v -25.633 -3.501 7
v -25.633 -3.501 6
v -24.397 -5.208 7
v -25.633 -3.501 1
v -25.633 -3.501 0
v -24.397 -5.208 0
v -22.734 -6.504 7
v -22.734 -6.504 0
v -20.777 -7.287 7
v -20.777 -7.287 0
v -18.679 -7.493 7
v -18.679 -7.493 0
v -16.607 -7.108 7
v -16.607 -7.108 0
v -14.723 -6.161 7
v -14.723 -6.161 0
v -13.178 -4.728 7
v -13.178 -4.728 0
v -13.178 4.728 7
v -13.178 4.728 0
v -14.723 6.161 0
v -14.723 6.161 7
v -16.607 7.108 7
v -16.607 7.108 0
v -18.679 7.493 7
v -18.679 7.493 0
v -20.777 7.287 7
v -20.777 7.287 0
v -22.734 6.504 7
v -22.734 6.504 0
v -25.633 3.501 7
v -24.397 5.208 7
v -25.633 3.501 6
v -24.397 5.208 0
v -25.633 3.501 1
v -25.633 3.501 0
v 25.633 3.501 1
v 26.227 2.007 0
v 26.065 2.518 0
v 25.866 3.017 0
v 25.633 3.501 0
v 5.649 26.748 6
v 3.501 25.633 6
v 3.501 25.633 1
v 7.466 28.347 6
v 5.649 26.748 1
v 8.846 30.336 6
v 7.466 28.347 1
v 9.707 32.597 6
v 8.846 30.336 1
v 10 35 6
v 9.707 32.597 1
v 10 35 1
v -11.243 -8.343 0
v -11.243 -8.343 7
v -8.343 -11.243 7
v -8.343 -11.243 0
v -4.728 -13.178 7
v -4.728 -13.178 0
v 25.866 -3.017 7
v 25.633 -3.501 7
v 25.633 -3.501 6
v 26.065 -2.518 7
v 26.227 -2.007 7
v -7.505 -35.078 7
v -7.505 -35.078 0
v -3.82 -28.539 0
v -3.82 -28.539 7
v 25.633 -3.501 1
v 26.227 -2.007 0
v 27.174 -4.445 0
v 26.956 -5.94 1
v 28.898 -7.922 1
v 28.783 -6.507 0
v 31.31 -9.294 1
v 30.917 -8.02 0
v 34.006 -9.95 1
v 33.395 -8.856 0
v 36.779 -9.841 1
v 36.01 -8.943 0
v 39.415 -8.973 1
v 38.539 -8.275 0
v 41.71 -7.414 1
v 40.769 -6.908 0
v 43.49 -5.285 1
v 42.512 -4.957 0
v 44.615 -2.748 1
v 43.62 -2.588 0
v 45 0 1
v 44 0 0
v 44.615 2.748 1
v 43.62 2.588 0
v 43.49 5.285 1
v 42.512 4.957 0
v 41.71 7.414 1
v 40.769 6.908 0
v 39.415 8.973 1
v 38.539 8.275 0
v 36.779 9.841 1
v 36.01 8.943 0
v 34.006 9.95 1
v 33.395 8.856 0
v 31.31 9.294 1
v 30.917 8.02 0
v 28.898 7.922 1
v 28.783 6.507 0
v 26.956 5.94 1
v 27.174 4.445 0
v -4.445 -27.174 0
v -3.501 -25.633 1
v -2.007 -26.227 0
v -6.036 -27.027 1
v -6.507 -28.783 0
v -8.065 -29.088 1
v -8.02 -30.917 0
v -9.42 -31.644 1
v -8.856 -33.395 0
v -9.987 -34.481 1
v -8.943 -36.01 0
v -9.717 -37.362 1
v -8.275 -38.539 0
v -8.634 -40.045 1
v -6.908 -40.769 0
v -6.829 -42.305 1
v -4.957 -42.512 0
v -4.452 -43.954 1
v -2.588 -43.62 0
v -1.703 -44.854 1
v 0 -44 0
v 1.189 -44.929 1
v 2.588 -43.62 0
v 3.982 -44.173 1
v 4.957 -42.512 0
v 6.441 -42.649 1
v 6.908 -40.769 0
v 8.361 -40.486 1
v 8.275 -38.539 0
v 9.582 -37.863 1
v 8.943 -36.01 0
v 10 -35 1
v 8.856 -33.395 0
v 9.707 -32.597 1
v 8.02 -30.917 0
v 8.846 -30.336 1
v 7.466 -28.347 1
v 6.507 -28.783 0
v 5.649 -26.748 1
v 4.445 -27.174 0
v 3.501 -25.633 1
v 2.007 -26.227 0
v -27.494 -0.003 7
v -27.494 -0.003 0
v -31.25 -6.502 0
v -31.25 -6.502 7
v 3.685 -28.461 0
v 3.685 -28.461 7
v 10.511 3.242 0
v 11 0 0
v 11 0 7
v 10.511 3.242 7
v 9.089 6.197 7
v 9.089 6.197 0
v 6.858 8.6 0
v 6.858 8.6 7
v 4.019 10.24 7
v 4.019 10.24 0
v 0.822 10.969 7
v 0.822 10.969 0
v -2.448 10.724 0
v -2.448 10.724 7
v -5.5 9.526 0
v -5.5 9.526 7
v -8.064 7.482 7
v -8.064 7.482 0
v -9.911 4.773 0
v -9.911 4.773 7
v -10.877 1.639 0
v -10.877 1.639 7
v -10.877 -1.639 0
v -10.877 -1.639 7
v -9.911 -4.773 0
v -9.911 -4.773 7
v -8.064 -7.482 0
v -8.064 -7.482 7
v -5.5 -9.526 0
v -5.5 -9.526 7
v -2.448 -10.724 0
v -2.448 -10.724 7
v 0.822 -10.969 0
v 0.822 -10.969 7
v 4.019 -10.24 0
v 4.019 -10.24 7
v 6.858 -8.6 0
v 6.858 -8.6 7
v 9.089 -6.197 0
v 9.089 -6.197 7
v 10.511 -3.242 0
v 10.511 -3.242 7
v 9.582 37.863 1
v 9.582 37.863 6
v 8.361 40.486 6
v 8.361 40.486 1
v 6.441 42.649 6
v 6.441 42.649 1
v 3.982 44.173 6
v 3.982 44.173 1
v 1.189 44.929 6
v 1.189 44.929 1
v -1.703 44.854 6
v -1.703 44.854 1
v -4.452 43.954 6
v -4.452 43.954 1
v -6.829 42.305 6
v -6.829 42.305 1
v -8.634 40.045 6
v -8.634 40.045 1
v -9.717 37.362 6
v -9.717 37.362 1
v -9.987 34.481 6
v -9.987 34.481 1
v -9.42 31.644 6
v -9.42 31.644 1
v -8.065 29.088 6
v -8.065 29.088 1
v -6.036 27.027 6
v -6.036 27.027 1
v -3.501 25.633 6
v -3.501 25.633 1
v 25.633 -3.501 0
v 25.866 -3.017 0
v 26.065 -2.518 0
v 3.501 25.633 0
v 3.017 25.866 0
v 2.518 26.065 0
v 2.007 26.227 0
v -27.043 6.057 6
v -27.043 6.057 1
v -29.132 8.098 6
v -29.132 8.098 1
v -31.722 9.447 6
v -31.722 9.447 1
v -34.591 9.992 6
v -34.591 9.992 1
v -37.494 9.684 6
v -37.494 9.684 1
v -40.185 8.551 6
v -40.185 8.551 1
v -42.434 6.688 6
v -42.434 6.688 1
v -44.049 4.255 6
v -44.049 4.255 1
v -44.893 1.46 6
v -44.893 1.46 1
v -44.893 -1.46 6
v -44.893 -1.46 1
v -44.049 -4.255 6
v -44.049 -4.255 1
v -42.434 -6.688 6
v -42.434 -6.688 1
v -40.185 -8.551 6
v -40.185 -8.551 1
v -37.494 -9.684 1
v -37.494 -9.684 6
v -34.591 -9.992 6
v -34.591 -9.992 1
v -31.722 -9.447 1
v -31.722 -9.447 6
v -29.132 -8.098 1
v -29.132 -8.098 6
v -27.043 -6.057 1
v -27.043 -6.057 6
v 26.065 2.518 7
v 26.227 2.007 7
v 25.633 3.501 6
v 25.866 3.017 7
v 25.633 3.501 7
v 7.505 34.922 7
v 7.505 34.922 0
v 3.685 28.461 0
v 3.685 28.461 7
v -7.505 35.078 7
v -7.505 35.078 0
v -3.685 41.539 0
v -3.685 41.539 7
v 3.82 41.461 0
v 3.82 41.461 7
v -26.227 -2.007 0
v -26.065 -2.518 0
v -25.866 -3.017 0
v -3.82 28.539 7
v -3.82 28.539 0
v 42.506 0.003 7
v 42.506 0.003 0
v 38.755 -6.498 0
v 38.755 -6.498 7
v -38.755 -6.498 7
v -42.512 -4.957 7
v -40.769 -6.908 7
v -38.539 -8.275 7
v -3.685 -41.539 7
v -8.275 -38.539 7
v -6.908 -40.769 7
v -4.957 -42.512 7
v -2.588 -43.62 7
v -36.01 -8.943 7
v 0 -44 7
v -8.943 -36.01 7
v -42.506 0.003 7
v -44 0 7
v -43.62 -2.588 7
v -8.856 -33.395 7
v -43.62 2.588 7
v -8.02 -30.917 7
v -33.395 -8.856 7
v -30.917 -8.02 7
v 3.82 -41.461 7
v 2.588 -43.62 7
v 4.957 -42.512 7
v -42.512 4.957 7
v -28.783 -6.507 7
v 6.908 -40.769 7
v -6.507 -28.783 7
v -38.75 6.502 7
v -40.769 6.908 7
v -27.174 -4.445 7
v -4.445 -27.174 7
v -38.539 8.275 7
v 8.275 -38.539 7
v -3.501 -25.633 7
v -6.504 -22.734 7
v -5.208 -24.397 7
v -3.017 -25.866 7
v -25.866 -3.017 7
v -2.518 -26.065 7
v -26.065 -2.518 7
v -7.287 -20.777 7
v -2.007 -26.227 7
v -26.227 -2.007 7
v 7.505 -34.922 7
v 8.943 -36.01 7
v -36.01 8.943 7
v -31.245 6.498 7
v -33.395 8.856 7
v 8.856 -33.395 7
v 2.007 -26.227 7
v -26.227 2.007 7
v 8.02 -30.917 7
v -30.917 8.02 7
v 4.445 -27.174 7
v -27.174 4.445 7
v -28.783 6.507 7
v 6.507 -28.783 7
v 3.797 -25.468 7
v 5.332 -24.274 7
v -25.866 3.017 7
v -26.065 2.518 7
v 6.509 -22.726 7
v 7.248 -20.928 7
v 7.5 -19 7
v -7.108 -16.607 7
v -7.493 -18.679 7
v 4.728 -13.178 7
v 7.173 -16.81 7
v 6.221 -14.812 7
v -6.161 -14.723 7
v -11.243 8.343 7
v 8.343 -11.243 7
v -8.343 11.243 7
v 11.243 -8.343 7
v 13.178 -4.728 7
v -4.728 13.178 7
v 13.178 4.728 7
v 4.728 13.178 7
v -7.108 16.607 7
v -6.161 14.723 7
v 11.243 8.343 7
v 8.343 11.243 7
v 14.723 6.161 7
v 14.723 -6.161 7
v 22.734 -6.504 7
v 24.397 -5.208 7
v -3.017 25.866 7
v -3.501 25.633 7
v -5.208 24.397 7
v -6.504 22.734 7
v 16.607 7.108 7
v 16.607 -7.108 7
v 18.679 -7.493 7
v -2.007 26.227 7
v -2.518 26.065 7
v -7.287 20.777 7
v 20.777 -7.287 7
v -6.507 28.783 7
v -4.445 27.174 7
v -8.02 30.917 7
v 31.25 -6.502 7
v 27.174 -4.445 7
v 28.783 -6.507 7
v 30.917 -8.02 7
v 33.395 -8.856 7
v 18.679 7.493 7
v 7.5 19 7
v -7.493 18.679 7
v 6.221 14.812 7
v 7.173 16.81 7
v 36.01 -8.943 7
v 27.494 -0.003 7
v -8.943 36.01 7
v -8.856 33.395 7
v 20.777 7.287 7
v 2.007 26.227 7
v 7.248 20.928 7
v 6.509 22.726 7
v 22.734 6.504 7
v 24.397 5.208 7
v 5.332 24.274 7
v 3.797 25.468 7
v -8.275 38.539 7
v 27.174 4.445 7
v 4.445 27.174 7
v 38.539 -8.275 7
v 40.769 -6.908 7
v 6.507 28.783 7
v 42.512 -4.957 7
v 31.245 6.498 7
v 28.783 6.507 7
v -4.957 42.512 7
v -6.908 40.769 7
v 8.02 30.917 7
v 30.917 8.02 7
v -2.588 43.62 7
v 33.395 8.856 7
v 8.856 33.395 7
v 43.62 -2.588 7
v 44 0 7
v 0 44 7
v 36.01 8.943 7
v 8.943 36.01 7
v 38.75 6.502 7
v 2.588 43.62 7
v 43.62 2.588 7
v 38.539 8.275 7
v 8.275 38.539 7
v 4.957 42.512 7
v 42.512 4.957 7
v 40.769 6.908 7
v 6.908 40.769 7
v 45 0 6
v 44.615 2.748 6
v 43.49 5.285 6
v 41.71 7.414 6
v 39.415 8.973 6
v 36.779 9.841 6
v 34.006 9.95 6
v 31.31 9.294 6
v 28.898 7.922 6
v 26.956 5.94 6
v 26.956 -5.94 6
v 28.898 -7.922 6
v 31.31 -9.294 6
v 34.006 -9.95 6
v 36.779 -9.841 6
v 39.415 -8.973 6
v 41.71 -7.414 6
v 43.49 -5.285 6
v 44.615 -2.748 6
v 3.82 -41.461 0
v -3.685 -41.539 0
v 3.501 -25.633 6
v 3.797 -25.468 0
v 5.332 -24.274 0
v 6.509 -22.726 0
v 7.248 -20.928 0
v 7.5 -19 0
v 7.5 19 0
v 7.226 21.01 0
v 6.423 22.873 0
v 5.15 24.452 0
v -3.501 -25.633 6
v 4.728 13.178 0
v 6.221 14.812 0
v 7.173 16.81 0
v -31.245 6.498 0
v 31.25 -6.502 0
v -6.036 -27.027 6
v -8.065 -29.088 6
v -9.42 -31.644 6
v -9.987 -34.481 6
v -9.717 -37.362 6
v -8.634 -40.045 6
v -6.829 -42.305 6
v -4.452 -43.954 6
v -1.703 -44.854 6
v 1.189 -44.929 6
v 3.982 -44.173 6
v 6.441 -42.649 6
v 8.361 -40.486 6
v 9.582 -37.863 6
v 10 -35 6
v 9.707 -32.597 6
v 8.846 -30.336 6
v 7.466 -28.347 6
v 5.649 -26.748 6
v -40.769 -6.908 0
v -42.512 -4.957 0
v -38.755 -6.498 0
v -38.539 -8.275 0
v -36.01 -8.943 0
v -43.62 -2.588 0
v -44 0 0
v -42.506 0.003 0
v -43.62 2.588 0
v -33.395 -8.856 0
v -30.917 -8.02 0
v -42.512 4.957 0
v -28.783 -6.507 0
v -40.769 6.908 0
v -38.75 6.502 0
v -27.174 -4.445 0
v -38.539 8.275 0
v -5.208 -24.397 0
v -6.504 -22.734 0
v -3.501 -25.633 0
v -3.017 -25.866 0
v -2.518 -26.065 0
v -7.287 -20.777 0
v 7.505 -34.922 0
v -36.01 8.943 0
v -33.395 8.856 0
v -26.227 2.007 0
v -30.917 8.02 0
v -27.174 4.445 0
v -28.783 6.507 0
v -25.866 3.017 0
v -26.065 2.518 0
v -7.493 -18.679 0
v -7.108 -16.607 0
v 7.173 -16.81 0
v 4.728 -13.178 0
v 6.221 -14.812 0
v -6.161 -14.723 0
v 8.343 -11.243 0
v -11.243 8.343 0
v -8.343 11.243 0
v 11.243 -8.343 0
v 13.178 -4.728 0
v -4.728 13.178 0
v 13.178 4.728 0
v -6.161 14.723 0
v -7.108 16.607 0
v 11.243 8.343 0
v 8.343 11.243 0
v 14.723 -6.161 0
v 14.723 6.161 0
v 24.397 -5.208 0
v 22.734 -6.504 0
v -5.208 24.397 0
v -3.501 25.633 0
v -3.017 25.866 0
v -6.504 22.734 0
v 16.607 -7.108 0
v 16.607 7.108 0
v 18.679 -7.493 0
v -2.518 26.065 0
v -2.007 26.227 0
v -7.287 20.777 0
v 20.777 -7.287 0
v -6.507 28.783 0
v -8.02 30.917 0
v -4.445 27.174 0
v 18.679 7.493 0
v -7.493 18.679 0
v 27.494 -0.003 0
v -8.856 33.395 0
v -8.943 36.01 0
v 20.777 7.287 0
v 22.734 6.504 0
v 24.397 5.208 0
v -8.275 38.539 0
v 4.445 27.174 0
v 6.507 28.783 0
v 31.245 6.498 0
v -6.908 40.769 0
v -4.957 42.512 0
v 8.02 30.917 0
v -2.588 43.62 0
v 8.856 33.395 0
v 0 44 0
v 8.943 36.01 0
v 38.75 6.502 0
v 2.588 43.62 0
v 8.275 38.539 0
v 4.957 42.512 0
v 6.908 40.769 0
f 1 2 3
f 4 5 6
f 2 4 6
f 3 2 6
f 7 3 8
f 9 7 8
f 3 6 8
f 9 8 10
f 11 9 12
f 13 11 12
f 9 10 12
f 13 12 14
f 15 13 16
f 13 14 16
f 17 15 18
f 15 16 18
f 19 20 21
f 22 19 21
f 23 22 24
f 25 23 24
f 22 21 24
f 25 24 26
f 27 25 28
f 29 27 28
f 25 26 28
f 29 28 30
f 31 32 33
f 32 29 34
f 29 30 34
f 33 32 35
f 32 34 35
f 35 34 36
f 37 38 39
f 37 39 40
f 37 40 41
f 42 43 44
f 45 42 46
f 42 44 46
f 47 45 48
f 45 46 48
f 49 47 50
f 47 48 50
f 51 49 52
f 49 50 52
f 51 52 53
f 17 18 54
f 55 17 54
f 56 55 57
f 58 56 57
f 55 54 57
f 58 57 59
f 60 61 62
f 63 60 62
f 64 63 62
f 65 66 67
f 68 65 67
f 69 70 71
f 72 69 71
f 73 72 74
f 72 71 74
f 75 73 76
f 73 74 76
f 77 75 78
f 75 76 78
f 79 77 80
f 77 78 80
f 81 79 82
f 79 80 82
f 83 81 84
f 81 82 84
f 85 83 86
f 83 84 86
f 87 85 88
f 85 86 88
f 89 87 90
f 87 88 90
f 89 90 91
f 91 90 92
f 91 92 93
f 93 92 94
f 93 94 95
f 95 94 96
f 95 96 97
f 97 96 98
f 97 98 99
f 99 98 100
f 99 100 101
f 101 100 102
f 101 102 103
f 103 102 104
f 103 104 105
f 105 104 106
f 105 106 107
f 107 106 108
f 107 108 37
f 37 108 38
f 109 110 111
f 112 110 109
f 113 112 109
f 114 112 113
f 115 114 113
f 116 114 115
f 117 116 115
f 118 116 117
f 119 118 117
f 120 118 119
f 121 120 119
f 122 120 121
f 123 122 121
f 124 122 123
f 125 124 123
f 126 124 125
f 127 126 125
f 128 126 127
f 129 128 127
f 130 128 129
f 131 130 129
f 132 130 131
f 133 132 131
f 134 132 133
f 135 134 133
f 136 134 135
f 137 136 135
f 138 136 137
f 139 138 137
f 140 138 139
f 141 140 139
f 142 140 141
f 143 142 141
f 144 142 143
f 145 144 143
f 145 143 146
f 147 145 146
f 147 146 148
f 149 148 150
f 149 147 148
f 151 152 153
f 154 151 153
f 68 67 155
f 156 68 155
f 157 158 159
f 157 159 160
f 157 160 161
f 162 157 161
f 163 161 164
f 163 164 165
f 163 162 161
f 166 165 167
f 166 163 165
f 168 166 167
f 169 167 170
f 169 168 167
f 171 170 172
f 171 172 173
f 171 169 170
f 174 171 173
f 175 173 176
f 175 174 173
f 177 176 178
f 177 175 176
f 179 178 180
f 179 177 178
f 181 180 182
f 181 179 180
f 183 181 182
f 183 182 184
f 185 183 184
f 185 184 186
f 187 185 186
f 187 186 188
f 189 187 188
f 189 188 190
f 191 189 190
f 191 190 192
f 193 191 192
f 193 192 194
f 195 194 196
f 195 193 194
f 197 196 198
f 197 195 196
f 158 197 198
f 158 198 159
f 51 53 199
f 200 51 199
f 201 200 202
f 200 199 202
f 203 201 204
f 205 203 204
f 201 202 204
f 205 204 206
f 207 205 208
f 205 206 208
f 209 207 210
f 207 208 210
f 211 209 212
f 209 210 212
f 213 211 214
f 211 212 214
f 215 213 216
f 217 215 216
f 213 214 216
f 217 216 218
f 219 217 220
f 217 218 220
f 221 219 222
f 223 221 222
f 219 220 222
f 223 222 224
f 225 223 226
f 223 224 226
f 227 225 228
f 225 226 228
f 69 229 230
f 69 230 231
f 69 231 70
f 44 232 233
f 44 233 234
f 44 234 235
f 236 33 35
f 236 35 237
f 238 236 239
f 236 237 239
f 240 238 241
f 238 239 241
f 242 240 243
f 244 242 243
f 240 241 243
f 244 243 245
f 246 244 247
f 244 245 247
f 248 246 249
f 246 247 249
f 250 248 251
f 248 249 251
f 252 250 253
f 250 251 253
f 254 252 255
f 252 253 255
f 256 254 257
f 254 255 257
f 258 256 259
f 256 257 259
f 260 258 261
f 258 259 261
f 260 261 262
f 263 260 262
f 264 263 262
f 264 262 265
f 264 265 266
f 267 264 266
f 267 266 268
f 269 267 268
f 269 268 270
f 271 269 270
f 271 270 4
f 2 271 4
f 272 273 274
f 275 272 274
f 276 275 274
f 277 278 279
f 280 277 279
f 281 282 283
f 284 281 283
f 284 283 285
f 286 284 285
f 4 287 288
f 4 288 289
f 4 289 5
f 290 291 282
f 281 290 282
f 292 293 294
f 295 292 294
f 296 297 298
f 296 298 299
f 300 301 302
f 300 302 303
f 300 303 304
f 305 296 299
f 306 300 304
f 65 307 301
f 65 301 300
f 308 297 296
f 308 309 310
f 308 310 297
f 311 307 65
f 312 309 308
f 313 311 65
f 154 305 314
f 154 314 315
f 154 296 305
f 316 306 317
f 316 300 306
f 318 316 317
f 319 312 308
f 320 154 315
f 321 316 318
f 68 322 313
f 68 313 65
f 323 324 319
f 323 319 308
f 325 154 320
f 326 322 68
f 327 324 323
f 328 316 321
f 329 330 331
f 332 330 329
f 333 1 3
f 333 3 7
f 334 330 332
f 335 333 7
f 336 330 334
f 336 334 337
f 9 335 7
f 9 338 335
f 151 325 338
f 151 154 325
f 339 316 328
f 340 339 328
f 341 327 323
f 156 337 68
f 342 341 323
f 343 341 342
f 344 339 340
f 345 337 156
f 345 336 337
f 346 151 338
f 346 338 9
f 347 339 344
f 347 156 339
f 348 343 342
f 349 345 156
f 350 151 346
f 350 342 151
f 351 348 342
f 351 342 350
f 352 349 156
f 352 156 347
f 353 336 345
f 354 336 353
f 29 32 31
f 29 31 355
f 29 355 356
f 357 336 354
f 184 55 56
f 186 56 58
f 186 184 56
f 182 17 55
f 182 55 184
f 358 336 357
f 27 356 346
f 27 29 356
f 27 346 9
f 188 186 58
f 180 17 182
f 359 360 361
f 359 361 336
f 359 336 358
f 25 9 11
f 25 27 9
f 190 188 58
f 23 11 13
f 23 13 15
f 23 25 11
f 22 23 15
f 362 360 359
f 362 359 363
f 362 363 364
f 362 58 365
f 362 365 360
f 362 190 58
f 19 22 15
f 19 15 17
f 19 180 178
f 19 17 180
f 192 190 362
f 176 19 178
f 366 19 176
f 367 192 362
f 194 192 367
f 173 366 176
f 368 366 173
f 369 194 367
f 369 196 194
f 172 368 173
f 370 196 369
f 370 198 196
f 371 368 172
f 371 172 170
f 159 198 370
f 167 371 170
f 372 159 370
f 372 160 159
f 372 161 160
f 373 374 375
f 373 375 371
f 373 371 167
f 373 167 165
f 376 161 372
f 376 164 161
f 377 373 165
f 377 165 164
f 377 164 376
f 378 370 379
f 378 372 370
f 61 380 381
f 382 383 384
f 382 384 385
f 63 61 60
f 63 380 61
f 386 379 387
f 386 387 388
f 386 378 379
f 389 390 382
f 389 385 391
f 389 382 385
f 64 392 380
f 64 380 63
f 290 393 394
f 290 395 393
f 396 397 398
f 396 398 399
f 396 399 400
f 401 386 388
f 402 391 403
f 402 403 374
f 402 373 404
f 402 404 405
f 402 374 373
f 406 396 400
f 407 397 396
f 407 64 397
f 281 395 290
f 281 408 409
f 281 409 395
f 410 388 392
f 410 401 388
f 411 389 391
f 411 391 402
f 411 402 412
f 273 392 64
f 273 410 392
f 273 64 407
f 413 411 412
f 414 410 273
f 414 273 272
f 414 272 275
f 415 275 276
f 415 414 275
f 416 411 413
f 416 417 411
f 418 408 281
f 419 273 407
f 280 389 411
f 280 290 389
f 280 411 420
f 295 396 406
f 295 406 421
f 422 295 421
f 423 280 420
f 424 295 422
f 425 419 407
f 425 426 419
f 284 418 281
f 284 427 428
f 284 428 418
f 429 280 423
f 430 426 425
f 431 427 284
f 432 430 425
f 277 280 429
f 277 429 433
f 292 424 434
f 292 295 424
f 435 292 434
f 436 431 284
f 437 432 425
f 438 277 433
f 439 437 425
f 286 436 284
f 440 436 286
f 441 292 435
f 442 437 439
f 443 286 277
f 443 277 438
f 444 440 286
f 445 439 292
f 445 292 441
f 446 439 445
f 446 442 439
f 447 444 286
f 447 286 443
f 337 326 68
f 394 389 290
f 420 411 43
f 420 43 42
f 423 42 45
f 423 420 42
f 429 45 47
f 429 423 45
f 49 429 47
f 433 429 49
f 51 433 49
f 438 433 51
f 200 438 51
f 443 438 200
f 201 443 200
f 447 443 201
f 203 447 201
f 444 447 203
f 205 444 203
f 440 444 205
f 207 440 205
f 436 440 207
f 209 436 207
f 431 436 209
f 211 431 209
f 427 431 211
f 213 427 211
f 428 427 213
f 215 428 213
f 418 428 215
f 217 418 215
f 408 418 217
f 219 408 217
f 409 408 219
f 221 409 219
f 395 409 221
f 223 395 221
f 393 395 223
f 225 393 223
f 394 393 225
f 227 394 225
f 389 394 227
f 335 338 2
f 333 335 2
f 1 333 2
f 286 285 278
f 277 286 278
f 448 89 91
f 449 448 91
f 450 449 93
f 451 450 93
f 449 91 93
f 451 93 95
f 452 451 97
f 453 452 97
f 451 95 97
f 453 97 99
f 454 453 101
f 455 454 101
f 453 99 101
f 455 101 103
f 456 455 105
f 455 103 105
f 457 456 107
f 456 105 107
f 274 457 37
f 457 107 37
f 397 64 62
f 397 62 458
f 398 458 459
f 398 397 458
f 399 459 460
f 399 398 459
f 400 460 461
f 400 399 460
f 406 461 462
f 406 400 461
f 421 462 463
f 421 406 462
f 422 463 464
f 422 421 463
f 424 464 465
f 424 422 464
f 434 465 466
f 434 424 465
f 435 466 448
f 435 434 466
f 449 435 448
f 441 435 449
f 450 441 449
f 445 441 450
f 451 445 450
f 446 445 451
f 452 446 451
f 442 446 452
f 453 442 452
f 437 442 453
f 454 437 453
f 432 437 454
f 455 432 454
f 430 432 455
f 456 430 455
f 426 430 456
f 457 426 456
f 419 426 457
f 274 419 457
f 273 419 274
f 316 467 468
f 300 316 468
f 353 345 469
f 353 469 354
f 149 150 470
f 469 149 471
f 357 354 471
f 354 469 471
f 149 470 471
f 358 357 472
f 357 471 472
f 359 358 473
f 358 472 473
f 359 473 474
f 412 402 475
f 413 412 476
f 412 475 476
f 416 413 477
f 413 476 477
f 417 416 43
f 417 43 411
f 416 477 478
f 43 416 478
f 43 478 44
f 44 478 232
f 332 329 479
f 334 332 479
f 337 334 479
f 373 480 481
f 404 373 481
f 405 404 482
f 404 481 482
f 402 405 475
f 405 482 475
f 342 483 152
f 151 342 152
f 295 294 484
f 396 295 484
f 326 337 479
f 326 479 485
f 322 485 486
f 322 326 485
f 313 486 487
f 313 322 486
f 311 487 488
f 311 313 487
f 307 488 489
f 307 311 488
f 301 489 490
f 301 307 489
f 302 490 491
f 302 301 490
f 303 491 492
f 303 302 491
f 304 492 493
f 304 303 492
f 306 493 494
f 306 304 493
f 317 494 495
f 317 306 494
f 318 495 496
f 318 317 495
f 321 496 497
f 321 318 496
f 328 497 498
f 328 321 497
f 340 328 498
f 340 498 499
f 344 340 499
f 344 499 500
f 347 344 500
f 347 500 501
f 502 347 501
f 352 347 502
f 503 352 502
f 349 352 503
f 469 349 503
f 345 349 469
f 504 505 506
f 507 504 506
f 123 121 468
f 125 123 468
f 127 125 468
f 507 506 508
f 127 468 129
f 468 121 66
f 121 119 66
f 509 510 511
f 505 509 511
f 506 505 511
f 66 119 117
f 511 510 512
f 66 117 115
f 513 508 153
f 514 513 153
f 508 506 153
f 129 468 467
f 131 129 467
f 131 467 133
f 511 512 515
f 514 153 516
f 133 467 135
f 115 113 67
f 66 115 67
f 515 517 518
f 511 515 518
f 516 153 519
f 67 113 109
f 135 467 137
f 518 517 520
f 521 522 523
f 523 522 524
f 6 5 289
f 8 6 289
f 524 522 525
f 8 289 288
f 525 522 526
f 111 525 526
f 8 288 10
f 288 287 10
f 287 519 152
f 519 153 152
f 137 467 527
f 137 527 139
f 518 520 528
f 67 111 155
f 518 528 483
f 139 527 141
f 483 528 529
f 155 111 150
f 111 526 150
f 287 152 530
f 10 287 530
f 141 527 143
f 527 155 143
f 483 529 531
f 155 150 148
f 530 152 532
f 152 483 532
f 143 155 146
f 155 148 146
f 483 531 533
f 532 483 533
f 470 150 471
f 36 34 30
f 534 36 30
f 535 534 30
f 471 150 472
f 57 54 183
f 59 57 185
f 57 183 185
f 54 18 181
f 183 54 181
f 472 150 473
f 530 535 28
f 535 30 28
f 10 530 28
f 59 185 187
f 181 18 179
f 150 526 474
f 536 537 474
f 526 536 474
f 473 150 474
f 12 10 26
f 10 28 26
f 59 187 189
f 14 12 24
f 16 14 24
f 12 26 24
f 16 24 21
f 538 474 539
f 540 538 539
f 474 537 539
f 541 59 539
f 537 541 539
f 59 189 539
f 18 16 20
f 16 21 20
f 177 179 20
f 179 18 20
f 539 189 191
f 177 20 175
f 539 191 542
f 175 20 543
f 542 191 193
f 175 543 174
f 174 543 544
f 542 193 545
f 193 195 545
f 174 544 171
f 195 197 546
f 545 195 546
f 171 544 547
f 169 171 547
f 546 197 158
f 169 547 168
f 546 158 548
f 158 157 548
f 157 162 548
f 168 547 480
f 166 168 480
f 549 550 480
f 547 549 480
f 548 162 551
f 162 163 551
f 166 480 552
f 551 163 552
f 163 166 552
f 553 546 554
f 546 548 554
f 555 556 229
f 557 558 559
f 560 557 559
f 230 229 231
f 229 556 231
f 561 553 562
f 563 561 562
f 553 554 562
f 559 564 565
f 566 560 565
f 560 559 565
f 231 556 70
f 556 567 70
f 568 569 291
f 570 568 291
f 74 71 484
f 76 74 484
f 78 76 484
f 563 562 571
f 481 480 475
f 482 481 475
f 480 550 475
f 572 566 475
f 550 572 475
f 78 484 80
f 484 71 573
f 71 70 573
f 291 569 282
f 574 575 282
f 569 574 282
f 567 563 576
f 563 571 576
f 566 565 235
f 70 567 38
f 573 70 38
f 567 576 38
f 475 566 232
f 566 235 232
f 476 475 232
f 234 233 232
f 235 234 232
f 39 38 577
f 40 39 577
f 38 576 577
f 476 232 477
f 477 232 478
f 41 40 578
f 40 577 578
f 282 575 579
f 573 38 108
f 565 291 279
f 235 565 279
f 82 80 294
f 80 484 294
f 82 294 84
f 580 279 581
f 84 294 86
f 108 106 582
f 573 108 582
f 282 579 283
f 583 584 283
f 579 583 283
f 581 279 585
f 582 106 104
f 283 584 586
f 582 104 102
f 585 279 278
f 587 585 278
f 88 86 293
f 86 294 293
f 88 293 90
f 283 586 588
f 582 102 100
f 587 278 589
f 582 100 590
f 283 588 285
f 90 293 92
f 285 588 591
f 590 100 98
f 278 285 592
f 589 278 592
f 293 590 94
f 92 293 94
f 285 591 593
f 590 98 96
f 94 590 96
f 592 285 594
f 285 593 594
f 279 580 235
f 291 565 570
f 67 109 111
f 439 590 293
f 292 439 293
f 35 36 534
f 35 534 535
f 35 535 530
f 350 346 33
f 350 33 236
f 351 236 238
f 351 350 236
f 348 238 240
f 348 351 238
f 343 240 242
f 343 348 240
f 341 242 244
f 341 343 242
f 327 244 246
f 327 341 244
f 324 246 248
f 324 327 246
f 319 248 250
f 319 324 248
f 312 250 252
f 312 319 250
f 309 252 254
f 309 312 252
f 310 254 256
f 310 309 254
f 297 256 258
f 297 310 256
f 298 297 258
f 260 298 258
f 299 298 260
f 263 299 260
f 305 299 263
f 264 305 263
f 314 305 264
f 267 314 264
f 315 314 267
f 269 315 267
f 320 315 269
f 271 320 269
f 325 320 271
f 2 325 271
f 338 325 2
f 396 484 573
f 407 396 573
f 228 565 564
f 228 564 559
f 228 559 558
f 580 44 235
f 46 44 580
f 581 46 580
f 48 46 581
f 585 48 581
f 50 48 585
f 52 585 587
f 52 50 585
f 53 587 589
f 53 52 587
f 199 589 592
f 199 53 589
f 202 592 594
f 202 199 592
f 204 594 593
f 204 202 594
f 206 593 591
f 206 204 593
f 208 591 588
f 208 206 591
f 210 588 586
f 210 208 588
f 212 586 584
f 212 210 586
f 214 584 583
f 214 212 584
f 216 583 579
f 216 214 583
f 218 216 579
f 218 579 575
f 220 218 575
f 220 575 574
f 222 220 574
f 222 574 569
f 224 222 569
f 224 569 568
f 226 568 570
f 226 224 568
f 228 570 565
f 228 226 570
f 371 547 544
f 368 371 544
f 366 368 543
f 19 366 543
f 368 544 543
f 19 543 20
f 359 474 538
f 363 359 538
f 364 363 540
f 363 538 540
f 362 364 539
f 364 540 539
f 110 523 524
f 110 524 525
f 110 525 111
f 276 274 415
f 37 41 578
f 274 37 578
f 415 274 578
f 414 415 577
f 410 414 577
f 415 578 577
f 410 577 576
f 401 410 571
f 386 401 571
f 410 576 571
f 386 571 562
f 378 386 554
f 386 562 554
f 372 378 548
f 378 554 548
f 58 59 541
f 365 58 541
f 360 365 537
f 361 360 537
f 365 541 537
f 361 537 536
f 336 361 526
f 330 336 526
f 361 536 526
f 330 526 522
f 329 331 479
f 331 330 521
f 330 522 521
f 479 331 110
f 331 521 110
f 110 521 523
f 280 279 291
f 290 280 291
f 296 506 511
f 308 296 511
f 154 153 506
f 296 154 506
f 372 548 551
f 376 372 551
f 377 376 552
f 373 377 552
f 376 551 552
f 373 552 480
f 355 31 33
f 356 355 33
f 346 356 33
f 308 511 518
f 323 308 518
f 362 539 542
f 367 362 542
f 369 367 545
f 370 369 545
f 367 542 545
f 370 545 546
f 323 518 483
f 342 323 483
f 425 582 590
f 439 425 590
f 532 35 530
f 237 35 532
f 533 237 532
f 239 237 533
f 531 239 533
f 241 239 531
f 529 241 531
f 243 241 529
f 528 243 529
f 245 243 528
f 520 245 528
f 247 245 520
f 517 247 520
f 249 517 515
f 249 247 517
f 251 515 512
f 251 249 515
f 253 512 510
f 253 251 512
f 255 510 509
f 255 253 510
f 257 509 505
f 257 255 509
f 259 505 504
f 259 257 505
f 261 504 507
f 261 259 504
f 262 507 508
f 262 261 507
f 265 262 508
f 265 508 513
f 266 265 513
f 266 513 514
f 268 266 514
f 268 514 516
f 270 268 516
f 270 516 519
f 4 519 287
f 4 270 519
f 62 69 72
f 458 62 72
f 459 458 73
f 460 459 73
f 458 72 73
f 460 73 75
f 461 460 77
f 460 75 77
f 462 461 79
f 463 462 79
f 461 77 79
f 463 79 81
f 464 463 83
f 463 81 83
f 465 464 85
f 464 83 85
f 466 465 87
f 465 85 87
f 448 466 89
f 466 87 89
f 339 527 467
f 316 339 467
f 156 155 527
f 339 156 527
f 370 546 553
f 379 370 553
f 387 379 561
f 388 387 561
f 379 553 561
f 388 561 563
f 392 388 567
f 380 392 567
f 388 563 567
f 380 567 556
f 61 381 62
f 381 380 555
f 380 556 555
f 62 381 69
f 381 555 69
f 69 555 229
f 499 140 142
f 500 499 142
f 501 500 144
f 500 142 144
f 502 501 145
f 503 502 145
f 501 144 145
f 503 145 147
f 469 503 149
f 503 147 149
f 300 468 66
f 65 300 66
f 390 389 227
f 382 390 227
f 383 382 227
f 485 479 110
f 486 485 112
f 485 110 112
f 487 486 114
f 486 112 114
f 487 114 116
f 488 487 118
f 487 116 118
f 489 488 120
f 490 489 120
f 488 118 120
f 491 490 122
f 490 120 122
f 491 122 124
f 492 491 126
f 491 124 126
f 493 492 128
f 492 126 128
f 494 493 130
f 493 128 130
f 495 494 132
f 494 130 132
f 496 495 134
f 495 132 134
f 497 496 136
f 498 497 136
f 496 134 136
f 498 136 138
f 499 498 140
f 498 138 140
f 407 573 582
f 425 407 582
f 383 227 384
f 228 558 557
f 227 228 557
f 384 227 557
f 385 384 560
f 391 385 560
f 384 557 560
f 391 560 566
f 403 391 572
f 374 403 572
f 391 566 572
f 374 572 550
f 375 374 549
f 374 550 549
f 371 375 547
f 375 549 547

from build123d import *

# Parameters (mm, degrees)
F0_R         = 11
F1_DEPTH     = 7
F2_T4_ANGLE  = 348.6337760753
F2_S5_R      = 7.5
F2_T6_DEPTH  = 16
F2_T10_ANGLE = 348.6337760753
F2_S11_R     = 7.5
F2_T12_DEPTH = 16
F2_T16_ANGLE = 348.6337760753
F2_S17_R     = 7.5
F2_T18_DEPTH = 16
F2_T22_ANGLE = 348.6337760753
F2_S23_R     = 7.5
F2_T24_DEPTH = 16
F3_T4_ANGLE  = 348.6337760753
F3_S5_R      = 7.5
F3_T6_DEPTH  = 16
F3_T10_ANGLE = 348.6337760753
F3_S11_R     = 7.5
F3_T12_DEPTH = 16
F3_T16_ANGLE = 348.6337760753
F3_S17_R     = 7.5
F3_T18_DEPTH = 16
F3_T22_ANGLE = 348.6337760753
F3_S23_R     = 7.5
F3_T24_DEPTH = 16


# Not quite as in the source:
# - a fillet or chamfer that OpenCascade refuses, or shapes differently, is made with other operations: its cross-section is extruded or revolved along the edge and cut away or added


with BuildPart() as f1:
    # F0 (on Top) → F1 (new body)
    with BuildSketch(Plane.XY):
        with BuildLine():
            ThreePointArc((13.1776315789, -4.727581408), (13.7928757354, -2.3992871748), (14, 0))
            ThreePointArc((14, 0), (13.7928757354, 2.3992871748), (13.1776315789, 4.727581408))
            ThreePointArc((13.1776315789, 4.727581408), (11.5, 0), (13.1776315789, -4.727581408))
        make_face()
        with BuildLine():
            ThreePointArc((13.1776315789, 4.727581408), (13.7928757354, 2.3992871748), (14, 0))
            ThreePointArc((14, 0), (13.7928757354, -2.3992871748), (13.1776315789, -4.727581408))
            ThreePointArc((13.1776315789, -4.727581408), (19.7351433448, -7.4638839931), (25.6328125, -3.5008282363))
            ThreePointArc((25.6328125, -3.5008282363), (25, 0), (25.6328125, 3.5008282363))
            ThreePointArc((25.6328125, 3.5008282363), (19.7351433448, 7.4638839931), (13.1776315789, 4.727581408))
        make_face()
        with BuildLine():
            ThreePointArc((13.1776315789, -4.727581408), (11.5, 0), (13.1776315789, 4.727581408))
            ThreePointArc((13.1776315789, 4.727581408), (9.8994949366, 9.8994949366), (4.727581408, 13.1776315789))
            ThreePointArc((4.727581408, 13.1776315789), (0, 11.5), (-4.727581408, 13.1776315789))
            ThreePointArc((-4.727581408, 13.1776315789), (-9.8994949366, 9.8994949366), (-13.1776315789, 4.727581408))
            ThreePointArc((-13.1776315789, 4.727581408), (-11.9318402976, 2.5082102027), (-11.5, 0))
            ThreePointArc((-11.5, 0), (-11.9318402976, -2.5082102027), (-13.1776315789, -4.727581408))
            ThreePointArc((-13.1776315789, -4.727581408), (-9.8994949366, -9.8994949366), (-4.727581408, -13.1776315789))
            ThreePointArc((-4.727581408, -13.1776315789), (0, -11.5), (4.727581408, -13.1776315789))
            ThreePointArc((4.727581408, -13.1776315789), (9.8994949366, -9.8994949366), (13.1776315789, -4.727581408))
        make_face()
        Circle(F0_R, mode=Mode.SUBTRACT)
        with BuildLine():
            ThreePointArc((-4.727581408, 13.1776315789), (0, 11.5), (4.727581408, 13.1776315789))
            ThreePointArc((4.727581408, 13.1776315789), (0, 14), (-4.727581408, 13.1776315789))
        make_face()
        with BuildLine():
            ThreePointArc((-4.727581408, 13.1776315789), (0, 14), (4.727581408, 13.1776315789))
            ThreePointArc((4.727581408, 13.1776315789), (6.7715160991, 15.7756287869), (7.5, 19))
            ThreePointArc((7.5, 19), (6.4228580777, 22.8725823573), (3.5008282363, 25.6328125))
            ThreePointArc((3.5008282363, 25.6328125), (0, 25), (-3.5008282363, 25.6328125))
            ThreePointArc((-3.5008282363, 25.6328125), (-7.4638839931, 19.7351433448), (-4.727581408, 13.1776315789))
        make_face()
        with BuildLine():
            ThreePointArc((45, 0), (36.7787811838, 9.8405252655), (25.6328125, 3.5008282363))
            ThreePointArc((25.6328125, 3.5008282363), (26.2799757469, 1.8033172558), (26.5, 0))
            ThreePointArc((26.5, 0), (26.2799757469, -1.8033172558), (25.6328125, -3.5008282363))
            ThreePointArc((25.6328125, -3.5008282363), (36.7787811838, -9.8405252655), (45, 0))
        make_face()
        Polygon((31.2446139721, 6.4984928341), (38.7501668667, 6.5015061182), (42.5055528946, 0.0030132841), (38.7553860279, -6.4984928341), (31.2498331333, -6.5015061182), (27.4944471054, -0.0030132841), align=None, mode=Mode.SUBTRACT)
        with BuildLine():
            ThreePointArc((26.5, 0), (26.2799757469, 1.8033172558), (25.6328125, 3.5008282363))
            ThreePointArc((25.6328125, 3.5008282363), (25, 0), (25.6328125, -3.5008282363))
            ThreePointArc((25.6328125, -3.5008282363), (26.2799757469, -1.8033172558), (26.5, 0))
        make_face()
        with BuildLine():
            ThreePointArc((7.5, -19), (6.7715160991, -15.7756287869), (4.727581408, -13.1776315789))
            ThreePointArc((4.727581408, -13.1776315789), (0, -14), (-4.727581408, -13.1776315789))
            ThreePointArc((-4.727581408, -13.1776315789), (-7.4638839931, -19.7351433448), (-3.5008282363, -25.6328125))
            ThreePointArc((-3.5008282363, -25.6328125), (0, -25), (3.5008282363, -25.6328125))
            ThreePointArc((3.5008282363, -25.6328125), (6.4228580777, -22.8725823573), (7.5, -19))
        make_face()
        with BuildLine():
            ThreePointArc((-4.727581408, -13.1776315789), (0, -14), (4.727581408, -13.1776315789))
            ThreePointArc((4.727581408, -13.1776315789), (0, -11.5), (-4.727581408, -13.1776315789))
        make_face()
        with BuildLine():
            ThreePointArc((-11.5, 0), (-11.9318402976, 2.5082102027), (-13.1776315789, 4.727581408))
            ThreePointArc((-13.1776315789, 4.727581408), (-14, 0), (-13.1776315789, -4.727581408))
            ThreePointArc((-13.1776315789, -4.727581408), (-11.9318402976, -2.5082102027), (-11.5, 0))
        make_face()
        with BuildLine():
            ThreePointArc((-13.1776315789, -4.727581408), (-14, 0), (-13.1776315789, 4.727581408))
            ThreePointArc((-13.1776315789, 4.727581408), (-19.7351433448, 7.4638839931), (-25.6328125, 3.5008282363))
            ThreePointArc((-25.6328125, 3.5008282363), (-25.1594747345, 1.7787811838), (-25, 0))
            ThreePointArc((-25, 0), (-25.1594747345, -1.7787811838), (-25.6328125, -3.5008282363))
            ThreePointArc((-25.6328125, -3.5008282363), (-19.7351433448, -7.4638839931), (-13.1776315789, -4.727581408))
        make_face()
        with BuildLine():
            ThreePointArc((10, 35), (-5.7005139083, 43.216090383), (-3.5008282363, 25.6328125))
            ThreePointArc((-3.5008282363, 25.6328125), (0, 26.5), (3.5008282363, 25.6328125))
            ThreePointArc((3.5008282363, 25.6328125), (8.216090383, 29.2994860917), (10, 35))
        make_face()
        Polygon((-3.684923821, 41.5387055115), (3.8202231703, 41.4605903958), (7.5051469914, 34.9218848843), (3.684923821, 28.4612944885), (-3.8202231703, 28.5394096042), (-7.5051469914, 35.0781151157), align=None, mode=Mode.SUBTRACT)
        with BuildLine():
            ThreePointArc((3.5008282363, 25.6328125), (0, 26.5), (-3.5008282363, 25.6328125))
            ThreePointArc((-3.5008282363, 25.6328125), (0, 25), (3.5008282363, 25.6328125))
        make_face()
        with BuildLine():
            ThreePointArc((3.5008282363, -25.6328125), (0, -25), (-3.5008282363, -25.6328125))
            ThreePointArc((-3.5008282363, -25.6328125), (0, -26.5), (3.5008282363, -25.6328125))
        make_face()
        with BuildLine():
            ThreePointArc((3.5008282363, -25.6328125), (0, -26.5), (-3.5008282363, -25.6328125))
            ThreePointArc((-3.5008282363, -25.6328125), (-5.7005139083, -43.216090383), (10, -35))
            ThreePointArc((10, -35), (8.216090383, -29.2994860917), (3.5008282363, -25.6328125))
        make_face()
        Polygon((3.8202231703, -41.4605903958), (-3.684923821, -41.5387055115), (-7.5051469914, -35.0781151157), (-3.8202231703, -28.5394096042), (3.684923821, -28.4612944885), (7.5051469914, -34.9218848843), align=None, mode=Mode.SUBTRACT)
        with BuildLine():
            ThreePointArc((-25, 0), (-25.1594747345, 1.7787811838), (-25.6328125, 3.5008282363))
            ThreePointArc((-25.6328125, 3.5008282363), (-26.5, 0), (-25.6328125, -3.5008282363))
            ThreePointArc((-25.6328125, -3.5008282363), (-25.1594747345, -1.7787811838), (-25, 0))
        make_face()
        with BuildLine():
            ThreePointArc((-25.6328125, -3.5008282363), (-26.5, 0), (-25.6328125, 3.5008282363))
            ThreePointArc((-25.6328125, 3.5008282363), (-45, 0), (-25.6328125, -3.5008282363))
        make_face()
        Polygon((-38.7501668667, 6.5015061182), (-31.2446139721, 6.4984928341), (-27.4944471054, -0.0030132841), (-31.2498331333, -6.5015061182), (-38.7553860279, -6.4984928341), (-42.5055528946, 0.0030132841), align=None, mode=Mode.SUBTRACT)
    extrude(amount=F1_DEPTH)

    # F2: chamfer of 1 on 4 edges, made by hand


with BuildPart() as f2_tool2:
    # F2_s3 → F2_t4 (revolve)
    with BuildSketch(Plane(origin=(-0.3432183296, 3.4488900698, 0), x_dir=(0, 0, 1), z_dir=(0.099026451, -0.9950848014, 0))):
        Polygon((6, 24.8279680496), (7, 25.8279680496), (7, 24.8279680496), align=None)
    revolve(axis=Axis((-35, 0, 7), (0, 0, 1)), revolution_arc=F2_T4_ANGLE)

    # F2_s5 → F2_t6 (cut, symmetric)
    with BuildSketch(Plane.XY.offset(6.5)):
        with Locations((-19, 0)):
            Circle(F2_S5_R)
    extrude(amount=F2_T6_DEPTH, both=True, mode=Mode.SUBTRACT)


with BuildPart() as f1_1:
    add(f1.part)

    # F2_t1: cut F2_tool2
    add(f2_tool2.part, mode=Mode.SUBTRACT)


with BuildPart() as f2_tool8:
    # F2_s9 → F2_t10 (revolve)
    with BuildSketch(Plane(origin=(3.4488900698, 0.3432183296, 0), x_dir=(0, 0, 1), z_dir=(-0.9950848014, -0.099026451, 0))):
        Polygon((6, 24.8279680496), (7, 25.8279680496), (7, 24.8279680496), align=None)
    revolve(axis=Axis((0, 35, 7), (0, 0, 1)), revolution_arc=F2_T10_ANGLE)

    # F2_s11 → F2_t12 (cut, symmetric)
    with BuildSketch(Plane.XY.offset(6.5)):
        with Locations((0, 19)):
            Circle(F2_S11_R)
    extrude(amount=F2_T12_DEPTH, both=True, mode=Mode.SUBTRACT)


with BuildPart() as f1_2:
    add(f1_1.part)

    # F2_t7: cut F2_tool8
    add(f2_tool8.part, mode=Mode.SUBTRACT)


with BuildPart() as f2_tool14:
    # F2_s15 → F2_t16 (revolve)
    with BuildSketch(Plane(origin=(-3.4488900698, -0.3432183296, 0), x_dir=(0, 0, 1), z_dir=(0.9950848014, 0.099026451, 0))):
        Polygon((6, 24.8279680496), (7, 25.8279680496), (7, 24.8279680496), align=None)
    revolve(axis=Axis((0, -35, 7), (0, 0, 1)), revolution_arc=F2_T16_ANGLE)

    # F2_s17 → F2_t18 (cut, symmetric)
    with BuildSketch(Plane.XY.offset(6.5)):
        with Locations((0, -19)):
            Circle(F2_S17_R)
    extrude(amount=F2_T18_DEPTH, both=True, mode=Mode.SUBTRACT)


with BuildPart() as f1_3:
    add(f1_2.part)

    # F2_t13: cut F2_tool14
    add(f2_tool14.part, mode=Mode.SUBTRACT)


with BuildPart() as f2_tool20:
    # F2_s21 → F2_t22 (revolve)
    with BuildSketch(Plane(origin=(0.3432183296, -3.4488900698, 0), x_dir=(0, 0, 1), z_dir=(-0.099026451, 0.9950848014, 0))):
        Polygon((6, 24.8279680496), (7, 25.8279680496), (7, 24.8279680496), align=None)
    revolve(axis=Axis((35, 0, 7), (0, 0, 1)), revolution_arc=F2_T22_ANGLE)

    # F2_s23 → F2_t24 (cut, symmetric)
    with BuildSketch(Plane.XY.offset(6.5)):
        with Locations((19, 0)):
            Circle(F2_S23_R)
    extrude(amount=F2_T24_DEPTH, both=True, mode=Mode.SUBTRACT)


with BuildPart() as f1_4:
    add(f1_3.part)

    # F2_t19: cut F2_tool20
    add(f2_tool20.part, mode=Mode.SUBTRACT)

    # F3: chamfer of 1 on 4 edges, made by hand


with BuildPart() as f3_tool2:
    # F3_s3 → F3_t4 (revolve)
    with BuildSketch(Plane(origin=(-0.3432183296, 3.4488900698, 0), x_dir=(0, 0, 1), z_dir=(0.099026451, -0.9950848014, 0))):
        Polygon((0, 25.8279680496), (1, 24.8279680496), (0, 24.8279680496), align=None)
    revolve(axis=Axis((-35, 0, 0), (0, 0, 1)), revolution_arc=F3_T4_ANGLE)

    # F3_s5 → F3_t6 (cut, symmetric)
    with BuildSketch(Plane.XY.offset(0.5)):
        with Locations((-19, 0)):
            Circle(F3_S5_R)
    extrude(amount=F3_T6_DEPTH, both=True, mode=Mode.SUBTRACT)


with BuildPart() as f1_5:
    add(f1_4.part)

    # F3_t1: cut F3_tool2
    add(f3_tool2.part, mode=Mode.SUBTRACT)


with BuildPart() as f3_tool8:
    # F3_s9 → F3_t10 (revolve)
    with BuildSketch(Plane(origin=(-3.4488900698, -0.3432183296, 0), x_dir=(0, 0, 1), z_dir=(0.9950848014, 0.099026451, 0))):
        Polygon((0, 25.8279680496), (1, 24.8279680496), (0, 24.8279680496), align=None)
    revolve(axis=Axis((0, -35, 0), (0, 0, 1)), revolution_arc=F3_T10_ANGLE)

    # F3_s11 → F3_t12 (cut, symmetric)
    with BuildSketch(Plane.XY.offset(0.5)):
        with Locations((0, -19)):
            Circle(F3_S11_R)
    extrude(amount=F3_T12_DEPTH, both=True, mode=Mode.SUBTRACT)


with BuildPart() as f1_6:
    add(f1_5.part)

    # F3_t7: cut F3_tool8
    add(f3_tool8.part, mode=Mode.SUBTRACT)


with BuildPart() as f3_tool14:
    # F3_s15 → F3_t16 (revolve)
    with BuildSketch(Plane(origin=(0.3432183296, -3.4488900698, 0), x_dir=(0, 0, 1), z_dir=(-0.099026451, 0.9950848014, 0))):
        Polygon((1, 24.8279680496), (0, 25.8279680496), (0, 24.8279680496), align=None)
    revolve(axis=Axis((35, 0, 0), (0, 0, 1)), revolution_arc=F3_T16_ANGLE)

    # F3_s17 → F3_t18 (cut, symmetric)
    with BuildSketch(Plane.XY.offset(0.5)):
        with Locations((19, 0)):
            Circle(F3_S17_R)
    extrude(amount=F3_T18_DEPTH, both=True, mode=Mode.SUBTRACT)


with BuildPart() as f1_7:
    add(f1_6.part)

    # F3_t13: cut F3_tool14
    add(f3_tool14.part, mode=Mode.SUBTRACT)


with BuildPart() as f3_tool20:
    # F3_s21 → F3_t22 (revolve)
    with BuildSketch(Plane(origin=(3.4488900698, 0.3432183296, 0), x_dir=(0, 0, 1), z_dir=(-0.9950848014, -0.099026451, 0))):
        Polygon((0, 25.8279680496), (1, 24.8279680496), (0, 24.8279680496), align=None)
    revolve(axis=Axis((0, 35, 0), (0, 0, 1)), revolution_arc=F3_T22_ANGLE)

    # F3_s23 → F3_t24 (cut, symmetric)
    with BuildSketch(Plane.XY.offset(0.5)):
        with Locations((0, 19)):
            Circle(F3_S23_R)
    extrude(amount=F3_T24_DEPTH, both=True, mode=Mode.SUBTRACT)


with BuildPart() as f1_8:
    add(f1_7.part)

    # F3_t19: cut F3_tool20
    add(f3_tool20.part, mode=Mode.SUBTRACT)


solid = f1_8.part
